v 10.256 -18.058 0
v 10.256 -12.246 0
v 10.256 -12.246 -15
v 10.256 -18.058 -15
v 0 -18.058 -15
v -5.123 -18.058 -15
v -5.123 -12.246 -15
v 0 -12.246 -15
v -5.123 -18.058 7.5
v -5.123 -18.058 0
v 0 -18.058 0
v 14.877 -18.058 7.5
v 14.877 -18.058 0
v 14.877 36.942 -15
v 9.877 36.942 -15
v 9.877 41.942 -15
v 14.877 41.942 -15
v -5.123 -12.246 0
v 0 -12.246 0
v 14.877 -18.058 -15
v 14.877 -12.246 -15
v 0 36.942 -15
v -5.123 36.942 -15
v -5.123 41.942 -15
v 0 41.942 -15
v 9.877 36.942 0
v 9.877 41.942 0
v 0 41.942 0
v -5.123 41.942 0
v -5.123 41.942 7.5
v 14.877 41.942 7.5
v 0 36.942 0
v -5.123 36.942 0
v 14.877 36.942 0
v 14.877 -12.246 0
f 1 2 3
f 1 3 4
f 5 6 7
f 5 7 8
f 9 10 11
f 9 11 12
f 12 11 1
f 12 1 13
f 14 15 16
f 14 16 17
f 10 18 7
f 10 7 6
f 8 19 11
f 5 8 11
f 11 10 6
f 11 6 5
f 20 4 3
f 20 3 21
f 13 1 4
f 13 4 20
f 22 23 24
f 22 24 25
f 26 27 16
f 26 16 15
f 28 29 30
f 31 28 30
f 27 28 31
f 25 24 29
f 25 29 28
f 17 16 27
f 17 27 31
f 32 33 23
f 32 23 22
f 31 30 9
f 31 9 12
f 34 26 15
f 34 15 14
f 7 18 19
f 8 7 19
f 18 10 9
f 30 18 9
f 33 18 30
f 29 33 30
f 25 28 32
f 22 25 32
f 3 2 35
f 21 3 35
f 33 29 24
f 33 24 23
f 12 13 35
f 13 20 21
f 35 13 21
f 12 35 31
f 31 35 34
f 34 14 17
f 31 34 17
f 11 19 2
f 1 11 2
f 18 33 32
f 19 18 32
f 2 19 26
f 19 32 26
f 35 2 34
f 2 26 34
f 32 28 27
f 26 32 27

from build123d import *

# Parameters (mm, degrees)
F0_W     = 20
F0_H     = 60
F1_DEPTH = 7.5
F2_W     = 5.122859
F2_H     = 5.811491
F2_W_2   = 4.621518
F2_W_3   = 5
F2_H_2   = 5
F3_DEPTH = 15


with BuildPart() as f1:
    # F0 (on Top) → F1 (new body)
    with BuildSketch(Plane.XY):
        with Locations((4.877141, 11.942423)):
            Rectangle(F0_W, F0_H)
    extrude(amount=F1_DEPTH)

    # F2 (on face) → F3 (join)
    with BuildSketch(Plane(origin=(0, 0, 0), x_dir=(1, 0, 0), z_dir=(0, 0, -1))):
        with Locations((-2.56143, 15.151832)):
            Rectangle(F2_W, F2_H)
        with Locations((12.566382, 15.151832)):
            Rectangle(F2_W_2, F2_H)
        with Locations((12.377141, -39.442423)):
            Rectangle(F2_W_3, F2_H_2)
        with Locations((-2.56143, -39.442423)):
            Rectangle(F2_W, F2_H_2)
    extrude(amount=F3_DEPTH)


solid = f1.part
